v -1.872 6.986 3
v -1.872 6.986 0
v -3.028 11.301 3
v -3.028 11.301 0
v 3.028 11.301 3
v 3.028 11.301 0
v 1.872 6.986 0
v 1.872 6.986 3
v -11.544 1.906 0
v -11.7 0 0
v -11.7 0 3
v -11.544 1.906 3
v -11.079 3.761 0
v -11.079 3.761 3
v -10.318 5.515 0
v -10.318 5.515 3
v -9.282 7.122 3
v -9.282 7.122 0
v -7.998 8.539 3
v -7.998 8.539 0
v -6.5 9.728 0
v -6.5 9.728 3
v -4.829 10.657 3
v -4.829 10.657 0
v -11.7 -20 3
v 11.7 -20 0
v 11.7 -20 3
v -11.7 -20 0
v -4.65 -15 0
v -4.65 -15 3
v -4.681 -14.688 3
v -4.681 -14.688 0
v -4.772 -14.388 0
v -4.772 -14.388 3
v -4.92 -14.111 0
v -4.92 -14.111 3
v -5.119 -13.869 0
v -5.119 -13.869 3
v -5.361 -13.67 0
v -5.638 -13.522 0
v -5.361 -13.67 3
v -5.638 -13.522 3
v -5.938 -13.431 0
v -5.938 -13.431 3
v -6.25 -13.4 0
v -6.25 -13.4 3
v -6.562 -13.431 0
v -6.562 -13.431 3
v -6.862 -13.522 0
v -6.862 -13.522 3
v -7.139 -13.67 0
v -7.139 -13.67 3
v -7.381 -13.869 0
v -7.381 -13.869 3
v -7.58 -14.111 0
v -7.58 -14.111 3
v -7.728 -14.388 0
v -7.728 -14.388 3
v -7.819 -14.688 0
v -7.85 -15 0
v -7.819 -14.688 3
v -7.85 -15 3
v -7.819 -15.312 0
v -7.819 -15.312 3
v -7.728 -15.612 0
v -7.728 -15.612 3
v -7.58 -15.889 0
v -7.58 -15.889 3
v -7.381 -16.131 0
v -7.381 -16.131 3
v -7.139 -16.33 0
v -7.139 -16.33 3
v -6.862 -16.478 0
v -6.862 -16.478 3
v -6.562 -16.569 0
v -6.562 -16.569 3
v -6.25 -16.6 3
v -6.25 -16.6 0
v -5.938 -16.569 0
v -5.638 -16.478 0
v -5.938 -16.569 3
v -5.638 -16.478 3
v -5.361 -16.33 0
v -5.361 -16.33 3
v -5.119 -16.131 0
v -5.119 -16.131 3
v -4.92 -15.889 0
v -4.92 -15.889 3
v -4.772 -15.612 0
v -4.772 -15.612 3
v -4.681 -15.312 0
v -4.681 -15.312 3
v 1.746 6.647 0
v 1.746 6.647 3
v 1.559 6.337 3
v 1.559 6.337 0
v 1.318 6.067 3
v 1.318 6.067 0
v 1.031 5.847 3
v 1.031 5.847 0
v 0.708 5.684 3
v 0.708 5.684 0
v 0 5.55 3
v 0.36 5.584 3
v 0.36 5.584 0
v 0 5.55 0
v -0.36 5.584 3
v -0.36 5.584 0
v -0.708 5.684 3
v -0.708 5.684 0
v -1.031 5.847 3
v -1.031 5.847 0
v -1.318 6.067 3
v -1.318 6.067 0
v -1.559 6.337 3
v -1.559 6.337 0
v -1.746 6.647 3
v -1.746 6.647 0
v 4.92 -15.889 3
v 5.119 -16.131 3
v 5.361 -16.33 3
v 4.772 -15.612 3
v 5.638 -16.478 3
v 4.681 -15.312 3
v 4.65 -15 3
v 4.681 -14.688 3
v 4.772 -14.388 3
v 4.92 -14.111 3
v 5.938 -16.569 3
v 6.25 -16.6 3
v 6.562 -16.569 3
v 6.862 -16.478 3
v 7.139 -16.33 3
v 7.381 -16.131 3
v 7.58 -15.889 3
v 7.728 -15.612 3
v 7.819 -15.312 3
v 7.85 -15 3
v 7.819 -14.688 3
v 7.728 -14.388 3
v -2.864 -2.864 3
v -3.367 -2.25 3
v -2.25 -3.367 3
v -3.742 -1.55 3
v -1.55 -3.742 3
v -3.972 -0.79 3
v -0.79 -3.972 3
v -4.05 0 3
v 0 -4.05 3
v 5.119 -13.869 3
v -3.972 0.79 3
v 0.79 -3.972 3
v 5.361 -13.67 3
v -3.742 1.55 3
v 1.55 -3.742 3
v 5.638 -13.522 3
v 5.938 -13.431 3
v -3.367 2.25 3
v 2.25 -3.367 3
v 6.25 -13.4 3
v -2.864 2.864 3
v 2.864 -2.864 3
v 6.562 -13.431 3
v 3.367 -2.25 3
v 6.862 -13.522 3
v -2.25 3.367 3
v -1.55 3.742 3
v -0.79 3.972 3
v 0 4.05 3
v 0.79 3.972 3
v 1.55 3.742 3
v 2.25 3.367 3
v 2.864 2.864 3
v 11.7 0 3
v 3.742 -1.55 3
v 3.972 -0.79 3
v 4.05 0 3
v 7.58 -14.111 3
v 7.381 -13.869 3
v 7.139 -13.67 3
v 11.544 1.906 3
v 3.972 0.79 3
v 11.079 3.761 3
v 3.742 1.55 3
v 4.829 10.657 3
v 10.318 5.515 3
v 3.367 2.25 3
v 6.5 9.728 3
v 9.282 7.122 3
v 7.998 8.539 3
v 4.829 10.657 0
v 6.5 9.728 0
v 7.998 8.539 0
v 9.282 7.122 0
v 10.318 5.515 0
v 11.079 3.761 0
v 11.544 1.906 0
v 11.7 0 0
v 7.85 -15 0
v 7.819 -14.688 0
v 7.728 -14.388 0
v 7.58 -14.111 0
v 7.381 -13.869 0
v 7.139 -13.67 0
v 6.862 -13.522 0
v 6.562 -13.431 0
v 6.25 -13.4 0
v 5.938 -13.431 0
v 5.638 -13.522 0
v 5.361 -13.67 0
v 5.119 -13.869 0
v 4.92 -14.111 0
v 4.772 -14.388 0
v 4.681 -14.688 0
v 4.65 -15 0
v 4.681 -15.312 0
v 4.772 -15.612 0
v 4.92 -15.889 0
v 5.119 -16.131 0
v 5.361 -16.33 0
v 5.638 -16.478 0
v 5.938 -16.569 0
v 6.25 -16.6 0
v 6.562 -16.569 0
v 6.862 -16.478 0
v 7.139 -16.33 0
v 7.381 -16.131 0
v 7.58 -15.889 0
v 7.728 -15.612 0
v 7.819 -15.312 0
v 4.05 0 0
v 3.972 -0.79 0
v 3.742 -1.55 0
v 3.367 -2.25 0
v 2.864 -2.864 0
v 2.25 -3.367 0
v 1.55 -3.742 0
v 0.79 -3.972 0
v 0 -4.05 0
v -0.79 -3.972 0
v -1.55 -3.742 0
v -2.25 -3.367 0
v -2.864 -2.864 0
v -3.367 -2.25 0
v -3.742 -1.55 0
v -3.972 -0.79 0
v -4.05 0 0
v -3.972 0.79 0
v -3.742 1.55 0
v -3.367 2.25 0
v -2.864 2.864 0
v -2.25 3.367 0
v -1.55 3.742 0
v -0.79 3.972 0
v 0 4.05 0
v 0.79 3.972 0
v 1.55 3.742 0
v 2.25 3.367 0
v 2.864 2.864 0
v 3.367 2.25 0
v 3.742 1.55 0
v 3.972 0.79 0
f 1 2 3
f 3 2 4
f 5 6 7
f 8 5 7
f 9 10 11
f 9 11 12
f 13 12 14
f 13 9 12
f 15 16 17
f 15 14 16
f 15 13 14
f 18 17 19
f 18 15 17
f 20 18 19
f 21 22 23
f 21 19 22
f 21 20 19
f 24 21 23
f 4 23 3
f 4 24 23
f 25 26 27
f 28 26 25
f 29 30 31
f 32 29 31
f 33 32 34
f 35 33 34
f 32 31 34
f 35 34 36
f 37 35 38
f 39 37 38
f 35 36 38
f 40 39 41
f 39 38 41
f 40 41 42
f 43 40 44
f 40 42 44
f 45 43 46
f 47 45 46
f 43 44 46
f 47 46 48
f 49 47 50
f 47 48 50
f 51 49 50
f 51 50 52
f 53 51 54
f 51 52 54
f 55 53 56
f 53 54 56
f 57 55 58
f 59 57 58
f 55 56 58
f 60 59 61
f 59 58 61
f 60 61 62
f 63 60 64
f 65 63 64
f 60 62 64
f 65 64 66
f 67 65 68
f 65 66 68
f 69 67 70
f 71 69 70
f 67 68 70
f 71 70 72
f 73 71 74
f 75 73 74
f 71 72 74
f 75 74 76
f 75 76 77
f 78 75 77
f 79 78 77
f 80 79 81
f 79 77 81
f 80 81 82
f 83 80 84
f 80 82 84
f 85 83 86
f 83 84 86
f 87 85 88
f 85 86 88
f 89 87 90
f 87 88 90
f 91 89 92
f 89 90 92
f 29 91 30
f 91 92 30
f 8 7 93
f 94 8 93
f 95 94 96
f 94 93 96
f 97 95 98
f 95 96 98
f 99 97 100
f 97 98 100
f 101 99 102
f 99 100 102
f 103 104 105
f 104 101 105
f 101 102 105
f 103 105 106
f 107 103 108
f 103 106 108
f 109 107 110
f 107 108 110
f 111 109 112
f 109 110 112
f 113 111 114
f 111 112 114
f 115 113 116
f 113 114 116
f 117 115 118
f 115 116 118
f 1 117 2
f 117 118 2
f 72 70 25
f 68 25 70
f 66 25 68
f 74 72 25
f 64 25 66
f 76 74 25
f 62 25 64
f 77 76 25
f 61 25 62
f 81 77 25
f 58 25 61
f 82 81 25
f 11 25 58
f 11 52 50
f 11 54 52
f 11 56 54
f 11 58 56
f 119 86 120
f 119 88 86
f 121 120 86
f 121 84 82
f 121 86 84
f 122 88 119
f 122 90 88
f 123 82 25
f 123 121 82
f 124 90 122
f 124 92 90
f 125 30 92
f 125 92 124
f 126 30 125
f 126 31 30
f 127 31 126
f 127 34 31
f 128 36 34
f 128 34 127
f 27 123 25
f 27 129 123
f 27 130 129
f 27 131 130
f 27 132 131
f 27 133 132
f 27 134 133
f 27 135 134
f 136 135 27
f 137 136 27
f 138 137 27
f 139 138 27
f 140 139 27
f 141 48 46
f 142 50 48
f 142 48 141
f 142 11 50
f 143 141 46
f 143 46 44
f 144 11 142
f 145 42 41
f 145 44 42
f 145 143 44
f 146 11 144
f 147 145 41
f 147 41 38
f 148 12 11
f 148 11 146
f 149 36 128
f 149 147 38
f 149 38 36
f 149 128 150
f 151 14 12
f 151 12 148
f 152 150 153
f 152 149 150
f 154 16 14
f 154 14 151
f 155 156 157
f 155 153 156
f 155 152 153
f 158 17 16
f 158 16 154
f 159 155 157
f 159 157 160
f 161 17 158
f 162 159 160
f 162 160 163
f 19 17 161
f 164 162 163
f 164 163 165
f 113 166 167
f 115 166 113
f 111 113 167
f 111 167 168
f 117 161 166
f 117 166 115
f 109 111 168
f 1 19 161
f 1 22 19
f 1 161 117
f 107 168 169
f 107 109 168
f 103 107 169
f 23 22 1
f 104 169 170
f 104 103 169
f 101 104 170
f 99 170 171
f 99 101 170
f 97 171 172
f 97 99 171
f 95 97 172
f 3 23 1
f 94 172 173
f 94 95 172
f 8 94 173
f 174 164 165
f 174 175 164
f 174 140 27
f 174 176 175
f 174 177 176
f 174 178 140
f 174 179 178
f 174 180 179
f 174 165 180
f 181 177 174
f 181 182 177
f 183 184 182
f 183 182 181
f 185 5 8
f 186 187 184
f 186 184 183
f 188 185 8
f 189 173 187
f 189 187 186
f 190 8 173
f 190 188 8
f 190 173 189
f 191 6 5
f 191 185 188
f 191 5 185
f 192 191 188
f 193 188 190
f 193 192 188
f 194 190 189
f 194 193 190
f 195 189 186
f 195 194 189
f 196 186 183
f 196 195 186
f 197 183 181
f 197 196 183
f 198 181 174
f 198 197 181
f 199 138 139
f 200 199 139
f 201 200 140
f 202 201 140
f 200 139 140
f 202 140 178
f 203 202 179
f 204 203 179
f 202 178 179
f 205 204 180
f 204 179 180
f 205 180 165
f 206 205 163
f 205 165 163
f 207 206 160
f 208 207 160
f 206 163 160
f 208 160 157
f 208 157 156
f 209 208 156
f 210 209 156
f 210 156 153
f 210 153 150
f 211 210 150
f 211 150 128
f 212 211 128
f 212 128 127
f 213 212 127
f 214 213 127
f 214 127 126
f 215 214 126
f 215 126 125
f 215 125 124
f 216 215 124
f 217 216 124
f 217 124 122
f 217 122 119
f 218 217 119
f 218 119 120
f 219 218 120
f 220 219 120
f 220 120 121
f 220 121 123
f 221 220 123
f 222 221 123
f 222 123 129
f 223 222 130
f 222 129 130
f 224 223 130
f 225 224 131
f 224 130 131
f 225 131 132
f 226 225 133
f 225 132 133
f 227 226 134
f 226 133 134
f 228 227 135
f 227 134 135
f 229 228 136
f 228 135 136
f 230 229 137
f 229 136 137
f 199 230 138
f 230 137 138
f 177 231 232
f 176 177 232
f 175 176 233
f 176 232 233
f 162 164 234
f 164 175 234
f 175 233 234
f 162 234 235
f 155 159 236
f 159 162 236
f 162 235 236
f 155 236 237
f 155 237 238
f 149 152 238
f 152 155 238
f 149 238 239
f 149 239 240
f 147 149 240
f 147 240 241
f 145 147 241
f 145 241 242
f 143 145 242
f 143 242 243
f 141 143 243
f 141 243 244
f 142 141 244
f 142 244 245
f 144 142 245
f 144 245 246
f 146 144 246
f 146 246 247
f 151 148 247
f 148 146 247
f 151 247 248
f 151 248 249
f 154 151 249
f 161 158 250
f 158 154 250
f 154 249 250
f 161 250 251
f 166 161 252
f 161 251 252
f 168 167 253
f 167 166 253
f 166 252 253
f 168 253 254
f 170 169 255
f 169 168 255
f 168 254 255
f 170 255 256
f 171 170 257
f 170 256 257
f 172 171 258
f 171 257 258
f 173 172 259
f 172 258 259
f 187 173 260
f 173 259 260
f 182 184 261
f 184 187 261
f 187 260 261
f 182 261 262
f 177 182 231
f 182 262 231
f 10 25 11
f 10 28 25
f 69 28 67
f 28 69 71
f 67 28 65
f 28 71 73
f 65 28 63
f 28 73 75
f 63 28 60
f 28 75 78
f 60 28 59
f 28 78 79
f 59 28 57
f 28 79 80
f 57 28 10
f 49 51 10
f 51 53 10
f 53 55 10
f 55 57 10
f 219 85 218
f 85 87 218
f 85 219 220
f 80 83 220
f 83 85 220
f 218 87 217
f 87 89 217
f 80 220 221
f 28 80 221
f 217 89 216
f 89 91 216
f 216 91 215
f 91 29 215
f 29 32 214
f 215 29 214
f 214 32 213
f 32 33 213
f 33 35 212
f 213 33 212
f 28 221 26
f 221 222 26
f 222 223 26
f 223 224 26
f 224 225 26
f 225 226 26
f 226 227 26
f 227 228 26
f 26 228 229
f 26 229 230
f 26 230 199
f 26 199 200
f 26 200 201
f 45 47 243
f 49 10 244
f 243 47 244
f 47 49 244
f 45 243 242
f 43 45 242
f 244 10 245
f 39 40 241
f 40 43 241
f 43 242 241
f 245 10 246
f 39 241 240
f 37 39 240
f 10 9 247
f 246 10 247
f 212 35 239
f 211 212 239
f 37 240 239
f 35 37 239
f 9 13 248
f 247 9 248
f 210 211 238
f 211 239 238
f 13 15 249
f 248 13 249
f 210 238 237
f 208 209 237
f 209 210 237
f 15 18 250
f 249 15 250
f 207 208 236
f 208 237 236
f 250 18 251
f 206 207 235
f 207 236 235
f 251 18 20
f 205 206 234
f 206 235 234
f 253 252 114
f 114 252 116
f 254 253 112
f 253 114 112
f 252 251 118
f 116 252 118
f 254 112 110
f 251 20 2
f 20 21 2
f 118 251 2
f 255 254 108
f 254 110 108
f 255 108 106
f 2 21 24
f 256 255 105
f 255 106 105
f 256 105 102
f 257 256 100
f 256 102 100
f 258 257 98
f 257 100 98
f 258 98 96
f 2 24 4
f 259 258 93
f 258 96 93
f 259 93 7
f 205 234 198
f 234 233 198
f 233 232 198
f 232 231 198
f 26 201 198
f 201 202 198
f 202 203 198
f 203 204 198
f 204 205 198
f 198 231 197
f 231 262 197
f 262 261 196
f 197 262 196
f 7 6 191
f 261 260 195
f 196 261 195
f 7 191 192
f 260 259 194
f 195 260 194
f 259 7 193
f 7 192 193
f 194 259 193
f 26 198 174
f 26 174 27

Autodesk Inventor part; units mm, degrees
ref_plane "YZ Plane" through (0, 0, 0) normal (1, 0, 0) x (0, 1, 0)
ref_plane "XZ Plane" through (0, 0, 0) normal (0, 1, 0) x (-1, 0, 0)
ref_plane "XY Plane" through (0, 0, 0) normal (0, 0, 1) x (1, 0, 0)
sketch "Sketch1" plane through (0, 0, 0) normal (0, 0, 1) x (1, 0, 0)
  arc A0 (-1.9, 11.5447) -> (-3.0282, 11.3013) centre (0, 0) ccw construction
  line L0 (0, 7.75) -> (0, 0) construction
  arc A1 (1.9, 11.5447) -> (-1.9, 11.5447) centre (0, 0) ccw construction
  circle A2 centre (0, 0) radius 4.05
  line L1 (11.7, 0) -> (11.7, -20)
  line L2 (11.7, -20) -> (-11.7, -20)
  line L3 (-11.7, -20) -> (-11.7, 0)
  arc A3 (11.7, 0) -> (3.0282, 11.3013) centre (0, 0) ccw
  arc A4 (-11.7, 0) -> (11.7, 0) centre (0, 0) ccw construction
  line L4 (3.0282, 11.3013) -> (1.872, 6.9864)
  line L5 (-1.872, 6.9864) -> (-3.0282, 11.3013)
  arc A5 (-1.872, 6.9864) -> (1.872, 6.9864) centre (0, 7.488) ccw
  arc A6 (3.0282, 11.3013) -> (1.9, 11.5447) centre (0, 0) ccw construction
  arc A7 (-3.0282, 11.3013) -> (-11.7, 0) centre (0, 0) ccw
  line L6 (-1.872, 6.9864) -> (0, 0) construction
  line L7 (0, 0) -> (1.872, 6.9864) construction
  line L8 (0, 5.55) -> (0, 4.05) construction
  dimension "d3" = 8.1
  dimension "d0" = 23.4
  dimension "d4" = 20
  dimension "d8" = 30
  dimension "d9" = 1.5
extrude "Extrusion1" add sketch "Sketch1" along normal blind 3
sketch "Sketch2" plane through (0, 0, 3) normal (0, 0, 1) x (1, 0, 0)
  circle A0 centre (-6.25, -15) radius 1.6
  circle A1 centre (6.25, -15) radius 1.6
  line L0 (-6.25, -15) -> (6.25, -15) construction
  line L1 (0, -15) -> (0, -20) construction
  line L2 (-11.7, -20) -> (11.7, -20) construction
  point P0 (0, 0)
  dimension "d10" = 3.2
  dimension "d11" = 5
  dimension "d12" = 12.5
extrude "Extrusion2" cut sketch "Sketch2" against normal through all
properties part number "Xgantry_CableChain_top_connector"
